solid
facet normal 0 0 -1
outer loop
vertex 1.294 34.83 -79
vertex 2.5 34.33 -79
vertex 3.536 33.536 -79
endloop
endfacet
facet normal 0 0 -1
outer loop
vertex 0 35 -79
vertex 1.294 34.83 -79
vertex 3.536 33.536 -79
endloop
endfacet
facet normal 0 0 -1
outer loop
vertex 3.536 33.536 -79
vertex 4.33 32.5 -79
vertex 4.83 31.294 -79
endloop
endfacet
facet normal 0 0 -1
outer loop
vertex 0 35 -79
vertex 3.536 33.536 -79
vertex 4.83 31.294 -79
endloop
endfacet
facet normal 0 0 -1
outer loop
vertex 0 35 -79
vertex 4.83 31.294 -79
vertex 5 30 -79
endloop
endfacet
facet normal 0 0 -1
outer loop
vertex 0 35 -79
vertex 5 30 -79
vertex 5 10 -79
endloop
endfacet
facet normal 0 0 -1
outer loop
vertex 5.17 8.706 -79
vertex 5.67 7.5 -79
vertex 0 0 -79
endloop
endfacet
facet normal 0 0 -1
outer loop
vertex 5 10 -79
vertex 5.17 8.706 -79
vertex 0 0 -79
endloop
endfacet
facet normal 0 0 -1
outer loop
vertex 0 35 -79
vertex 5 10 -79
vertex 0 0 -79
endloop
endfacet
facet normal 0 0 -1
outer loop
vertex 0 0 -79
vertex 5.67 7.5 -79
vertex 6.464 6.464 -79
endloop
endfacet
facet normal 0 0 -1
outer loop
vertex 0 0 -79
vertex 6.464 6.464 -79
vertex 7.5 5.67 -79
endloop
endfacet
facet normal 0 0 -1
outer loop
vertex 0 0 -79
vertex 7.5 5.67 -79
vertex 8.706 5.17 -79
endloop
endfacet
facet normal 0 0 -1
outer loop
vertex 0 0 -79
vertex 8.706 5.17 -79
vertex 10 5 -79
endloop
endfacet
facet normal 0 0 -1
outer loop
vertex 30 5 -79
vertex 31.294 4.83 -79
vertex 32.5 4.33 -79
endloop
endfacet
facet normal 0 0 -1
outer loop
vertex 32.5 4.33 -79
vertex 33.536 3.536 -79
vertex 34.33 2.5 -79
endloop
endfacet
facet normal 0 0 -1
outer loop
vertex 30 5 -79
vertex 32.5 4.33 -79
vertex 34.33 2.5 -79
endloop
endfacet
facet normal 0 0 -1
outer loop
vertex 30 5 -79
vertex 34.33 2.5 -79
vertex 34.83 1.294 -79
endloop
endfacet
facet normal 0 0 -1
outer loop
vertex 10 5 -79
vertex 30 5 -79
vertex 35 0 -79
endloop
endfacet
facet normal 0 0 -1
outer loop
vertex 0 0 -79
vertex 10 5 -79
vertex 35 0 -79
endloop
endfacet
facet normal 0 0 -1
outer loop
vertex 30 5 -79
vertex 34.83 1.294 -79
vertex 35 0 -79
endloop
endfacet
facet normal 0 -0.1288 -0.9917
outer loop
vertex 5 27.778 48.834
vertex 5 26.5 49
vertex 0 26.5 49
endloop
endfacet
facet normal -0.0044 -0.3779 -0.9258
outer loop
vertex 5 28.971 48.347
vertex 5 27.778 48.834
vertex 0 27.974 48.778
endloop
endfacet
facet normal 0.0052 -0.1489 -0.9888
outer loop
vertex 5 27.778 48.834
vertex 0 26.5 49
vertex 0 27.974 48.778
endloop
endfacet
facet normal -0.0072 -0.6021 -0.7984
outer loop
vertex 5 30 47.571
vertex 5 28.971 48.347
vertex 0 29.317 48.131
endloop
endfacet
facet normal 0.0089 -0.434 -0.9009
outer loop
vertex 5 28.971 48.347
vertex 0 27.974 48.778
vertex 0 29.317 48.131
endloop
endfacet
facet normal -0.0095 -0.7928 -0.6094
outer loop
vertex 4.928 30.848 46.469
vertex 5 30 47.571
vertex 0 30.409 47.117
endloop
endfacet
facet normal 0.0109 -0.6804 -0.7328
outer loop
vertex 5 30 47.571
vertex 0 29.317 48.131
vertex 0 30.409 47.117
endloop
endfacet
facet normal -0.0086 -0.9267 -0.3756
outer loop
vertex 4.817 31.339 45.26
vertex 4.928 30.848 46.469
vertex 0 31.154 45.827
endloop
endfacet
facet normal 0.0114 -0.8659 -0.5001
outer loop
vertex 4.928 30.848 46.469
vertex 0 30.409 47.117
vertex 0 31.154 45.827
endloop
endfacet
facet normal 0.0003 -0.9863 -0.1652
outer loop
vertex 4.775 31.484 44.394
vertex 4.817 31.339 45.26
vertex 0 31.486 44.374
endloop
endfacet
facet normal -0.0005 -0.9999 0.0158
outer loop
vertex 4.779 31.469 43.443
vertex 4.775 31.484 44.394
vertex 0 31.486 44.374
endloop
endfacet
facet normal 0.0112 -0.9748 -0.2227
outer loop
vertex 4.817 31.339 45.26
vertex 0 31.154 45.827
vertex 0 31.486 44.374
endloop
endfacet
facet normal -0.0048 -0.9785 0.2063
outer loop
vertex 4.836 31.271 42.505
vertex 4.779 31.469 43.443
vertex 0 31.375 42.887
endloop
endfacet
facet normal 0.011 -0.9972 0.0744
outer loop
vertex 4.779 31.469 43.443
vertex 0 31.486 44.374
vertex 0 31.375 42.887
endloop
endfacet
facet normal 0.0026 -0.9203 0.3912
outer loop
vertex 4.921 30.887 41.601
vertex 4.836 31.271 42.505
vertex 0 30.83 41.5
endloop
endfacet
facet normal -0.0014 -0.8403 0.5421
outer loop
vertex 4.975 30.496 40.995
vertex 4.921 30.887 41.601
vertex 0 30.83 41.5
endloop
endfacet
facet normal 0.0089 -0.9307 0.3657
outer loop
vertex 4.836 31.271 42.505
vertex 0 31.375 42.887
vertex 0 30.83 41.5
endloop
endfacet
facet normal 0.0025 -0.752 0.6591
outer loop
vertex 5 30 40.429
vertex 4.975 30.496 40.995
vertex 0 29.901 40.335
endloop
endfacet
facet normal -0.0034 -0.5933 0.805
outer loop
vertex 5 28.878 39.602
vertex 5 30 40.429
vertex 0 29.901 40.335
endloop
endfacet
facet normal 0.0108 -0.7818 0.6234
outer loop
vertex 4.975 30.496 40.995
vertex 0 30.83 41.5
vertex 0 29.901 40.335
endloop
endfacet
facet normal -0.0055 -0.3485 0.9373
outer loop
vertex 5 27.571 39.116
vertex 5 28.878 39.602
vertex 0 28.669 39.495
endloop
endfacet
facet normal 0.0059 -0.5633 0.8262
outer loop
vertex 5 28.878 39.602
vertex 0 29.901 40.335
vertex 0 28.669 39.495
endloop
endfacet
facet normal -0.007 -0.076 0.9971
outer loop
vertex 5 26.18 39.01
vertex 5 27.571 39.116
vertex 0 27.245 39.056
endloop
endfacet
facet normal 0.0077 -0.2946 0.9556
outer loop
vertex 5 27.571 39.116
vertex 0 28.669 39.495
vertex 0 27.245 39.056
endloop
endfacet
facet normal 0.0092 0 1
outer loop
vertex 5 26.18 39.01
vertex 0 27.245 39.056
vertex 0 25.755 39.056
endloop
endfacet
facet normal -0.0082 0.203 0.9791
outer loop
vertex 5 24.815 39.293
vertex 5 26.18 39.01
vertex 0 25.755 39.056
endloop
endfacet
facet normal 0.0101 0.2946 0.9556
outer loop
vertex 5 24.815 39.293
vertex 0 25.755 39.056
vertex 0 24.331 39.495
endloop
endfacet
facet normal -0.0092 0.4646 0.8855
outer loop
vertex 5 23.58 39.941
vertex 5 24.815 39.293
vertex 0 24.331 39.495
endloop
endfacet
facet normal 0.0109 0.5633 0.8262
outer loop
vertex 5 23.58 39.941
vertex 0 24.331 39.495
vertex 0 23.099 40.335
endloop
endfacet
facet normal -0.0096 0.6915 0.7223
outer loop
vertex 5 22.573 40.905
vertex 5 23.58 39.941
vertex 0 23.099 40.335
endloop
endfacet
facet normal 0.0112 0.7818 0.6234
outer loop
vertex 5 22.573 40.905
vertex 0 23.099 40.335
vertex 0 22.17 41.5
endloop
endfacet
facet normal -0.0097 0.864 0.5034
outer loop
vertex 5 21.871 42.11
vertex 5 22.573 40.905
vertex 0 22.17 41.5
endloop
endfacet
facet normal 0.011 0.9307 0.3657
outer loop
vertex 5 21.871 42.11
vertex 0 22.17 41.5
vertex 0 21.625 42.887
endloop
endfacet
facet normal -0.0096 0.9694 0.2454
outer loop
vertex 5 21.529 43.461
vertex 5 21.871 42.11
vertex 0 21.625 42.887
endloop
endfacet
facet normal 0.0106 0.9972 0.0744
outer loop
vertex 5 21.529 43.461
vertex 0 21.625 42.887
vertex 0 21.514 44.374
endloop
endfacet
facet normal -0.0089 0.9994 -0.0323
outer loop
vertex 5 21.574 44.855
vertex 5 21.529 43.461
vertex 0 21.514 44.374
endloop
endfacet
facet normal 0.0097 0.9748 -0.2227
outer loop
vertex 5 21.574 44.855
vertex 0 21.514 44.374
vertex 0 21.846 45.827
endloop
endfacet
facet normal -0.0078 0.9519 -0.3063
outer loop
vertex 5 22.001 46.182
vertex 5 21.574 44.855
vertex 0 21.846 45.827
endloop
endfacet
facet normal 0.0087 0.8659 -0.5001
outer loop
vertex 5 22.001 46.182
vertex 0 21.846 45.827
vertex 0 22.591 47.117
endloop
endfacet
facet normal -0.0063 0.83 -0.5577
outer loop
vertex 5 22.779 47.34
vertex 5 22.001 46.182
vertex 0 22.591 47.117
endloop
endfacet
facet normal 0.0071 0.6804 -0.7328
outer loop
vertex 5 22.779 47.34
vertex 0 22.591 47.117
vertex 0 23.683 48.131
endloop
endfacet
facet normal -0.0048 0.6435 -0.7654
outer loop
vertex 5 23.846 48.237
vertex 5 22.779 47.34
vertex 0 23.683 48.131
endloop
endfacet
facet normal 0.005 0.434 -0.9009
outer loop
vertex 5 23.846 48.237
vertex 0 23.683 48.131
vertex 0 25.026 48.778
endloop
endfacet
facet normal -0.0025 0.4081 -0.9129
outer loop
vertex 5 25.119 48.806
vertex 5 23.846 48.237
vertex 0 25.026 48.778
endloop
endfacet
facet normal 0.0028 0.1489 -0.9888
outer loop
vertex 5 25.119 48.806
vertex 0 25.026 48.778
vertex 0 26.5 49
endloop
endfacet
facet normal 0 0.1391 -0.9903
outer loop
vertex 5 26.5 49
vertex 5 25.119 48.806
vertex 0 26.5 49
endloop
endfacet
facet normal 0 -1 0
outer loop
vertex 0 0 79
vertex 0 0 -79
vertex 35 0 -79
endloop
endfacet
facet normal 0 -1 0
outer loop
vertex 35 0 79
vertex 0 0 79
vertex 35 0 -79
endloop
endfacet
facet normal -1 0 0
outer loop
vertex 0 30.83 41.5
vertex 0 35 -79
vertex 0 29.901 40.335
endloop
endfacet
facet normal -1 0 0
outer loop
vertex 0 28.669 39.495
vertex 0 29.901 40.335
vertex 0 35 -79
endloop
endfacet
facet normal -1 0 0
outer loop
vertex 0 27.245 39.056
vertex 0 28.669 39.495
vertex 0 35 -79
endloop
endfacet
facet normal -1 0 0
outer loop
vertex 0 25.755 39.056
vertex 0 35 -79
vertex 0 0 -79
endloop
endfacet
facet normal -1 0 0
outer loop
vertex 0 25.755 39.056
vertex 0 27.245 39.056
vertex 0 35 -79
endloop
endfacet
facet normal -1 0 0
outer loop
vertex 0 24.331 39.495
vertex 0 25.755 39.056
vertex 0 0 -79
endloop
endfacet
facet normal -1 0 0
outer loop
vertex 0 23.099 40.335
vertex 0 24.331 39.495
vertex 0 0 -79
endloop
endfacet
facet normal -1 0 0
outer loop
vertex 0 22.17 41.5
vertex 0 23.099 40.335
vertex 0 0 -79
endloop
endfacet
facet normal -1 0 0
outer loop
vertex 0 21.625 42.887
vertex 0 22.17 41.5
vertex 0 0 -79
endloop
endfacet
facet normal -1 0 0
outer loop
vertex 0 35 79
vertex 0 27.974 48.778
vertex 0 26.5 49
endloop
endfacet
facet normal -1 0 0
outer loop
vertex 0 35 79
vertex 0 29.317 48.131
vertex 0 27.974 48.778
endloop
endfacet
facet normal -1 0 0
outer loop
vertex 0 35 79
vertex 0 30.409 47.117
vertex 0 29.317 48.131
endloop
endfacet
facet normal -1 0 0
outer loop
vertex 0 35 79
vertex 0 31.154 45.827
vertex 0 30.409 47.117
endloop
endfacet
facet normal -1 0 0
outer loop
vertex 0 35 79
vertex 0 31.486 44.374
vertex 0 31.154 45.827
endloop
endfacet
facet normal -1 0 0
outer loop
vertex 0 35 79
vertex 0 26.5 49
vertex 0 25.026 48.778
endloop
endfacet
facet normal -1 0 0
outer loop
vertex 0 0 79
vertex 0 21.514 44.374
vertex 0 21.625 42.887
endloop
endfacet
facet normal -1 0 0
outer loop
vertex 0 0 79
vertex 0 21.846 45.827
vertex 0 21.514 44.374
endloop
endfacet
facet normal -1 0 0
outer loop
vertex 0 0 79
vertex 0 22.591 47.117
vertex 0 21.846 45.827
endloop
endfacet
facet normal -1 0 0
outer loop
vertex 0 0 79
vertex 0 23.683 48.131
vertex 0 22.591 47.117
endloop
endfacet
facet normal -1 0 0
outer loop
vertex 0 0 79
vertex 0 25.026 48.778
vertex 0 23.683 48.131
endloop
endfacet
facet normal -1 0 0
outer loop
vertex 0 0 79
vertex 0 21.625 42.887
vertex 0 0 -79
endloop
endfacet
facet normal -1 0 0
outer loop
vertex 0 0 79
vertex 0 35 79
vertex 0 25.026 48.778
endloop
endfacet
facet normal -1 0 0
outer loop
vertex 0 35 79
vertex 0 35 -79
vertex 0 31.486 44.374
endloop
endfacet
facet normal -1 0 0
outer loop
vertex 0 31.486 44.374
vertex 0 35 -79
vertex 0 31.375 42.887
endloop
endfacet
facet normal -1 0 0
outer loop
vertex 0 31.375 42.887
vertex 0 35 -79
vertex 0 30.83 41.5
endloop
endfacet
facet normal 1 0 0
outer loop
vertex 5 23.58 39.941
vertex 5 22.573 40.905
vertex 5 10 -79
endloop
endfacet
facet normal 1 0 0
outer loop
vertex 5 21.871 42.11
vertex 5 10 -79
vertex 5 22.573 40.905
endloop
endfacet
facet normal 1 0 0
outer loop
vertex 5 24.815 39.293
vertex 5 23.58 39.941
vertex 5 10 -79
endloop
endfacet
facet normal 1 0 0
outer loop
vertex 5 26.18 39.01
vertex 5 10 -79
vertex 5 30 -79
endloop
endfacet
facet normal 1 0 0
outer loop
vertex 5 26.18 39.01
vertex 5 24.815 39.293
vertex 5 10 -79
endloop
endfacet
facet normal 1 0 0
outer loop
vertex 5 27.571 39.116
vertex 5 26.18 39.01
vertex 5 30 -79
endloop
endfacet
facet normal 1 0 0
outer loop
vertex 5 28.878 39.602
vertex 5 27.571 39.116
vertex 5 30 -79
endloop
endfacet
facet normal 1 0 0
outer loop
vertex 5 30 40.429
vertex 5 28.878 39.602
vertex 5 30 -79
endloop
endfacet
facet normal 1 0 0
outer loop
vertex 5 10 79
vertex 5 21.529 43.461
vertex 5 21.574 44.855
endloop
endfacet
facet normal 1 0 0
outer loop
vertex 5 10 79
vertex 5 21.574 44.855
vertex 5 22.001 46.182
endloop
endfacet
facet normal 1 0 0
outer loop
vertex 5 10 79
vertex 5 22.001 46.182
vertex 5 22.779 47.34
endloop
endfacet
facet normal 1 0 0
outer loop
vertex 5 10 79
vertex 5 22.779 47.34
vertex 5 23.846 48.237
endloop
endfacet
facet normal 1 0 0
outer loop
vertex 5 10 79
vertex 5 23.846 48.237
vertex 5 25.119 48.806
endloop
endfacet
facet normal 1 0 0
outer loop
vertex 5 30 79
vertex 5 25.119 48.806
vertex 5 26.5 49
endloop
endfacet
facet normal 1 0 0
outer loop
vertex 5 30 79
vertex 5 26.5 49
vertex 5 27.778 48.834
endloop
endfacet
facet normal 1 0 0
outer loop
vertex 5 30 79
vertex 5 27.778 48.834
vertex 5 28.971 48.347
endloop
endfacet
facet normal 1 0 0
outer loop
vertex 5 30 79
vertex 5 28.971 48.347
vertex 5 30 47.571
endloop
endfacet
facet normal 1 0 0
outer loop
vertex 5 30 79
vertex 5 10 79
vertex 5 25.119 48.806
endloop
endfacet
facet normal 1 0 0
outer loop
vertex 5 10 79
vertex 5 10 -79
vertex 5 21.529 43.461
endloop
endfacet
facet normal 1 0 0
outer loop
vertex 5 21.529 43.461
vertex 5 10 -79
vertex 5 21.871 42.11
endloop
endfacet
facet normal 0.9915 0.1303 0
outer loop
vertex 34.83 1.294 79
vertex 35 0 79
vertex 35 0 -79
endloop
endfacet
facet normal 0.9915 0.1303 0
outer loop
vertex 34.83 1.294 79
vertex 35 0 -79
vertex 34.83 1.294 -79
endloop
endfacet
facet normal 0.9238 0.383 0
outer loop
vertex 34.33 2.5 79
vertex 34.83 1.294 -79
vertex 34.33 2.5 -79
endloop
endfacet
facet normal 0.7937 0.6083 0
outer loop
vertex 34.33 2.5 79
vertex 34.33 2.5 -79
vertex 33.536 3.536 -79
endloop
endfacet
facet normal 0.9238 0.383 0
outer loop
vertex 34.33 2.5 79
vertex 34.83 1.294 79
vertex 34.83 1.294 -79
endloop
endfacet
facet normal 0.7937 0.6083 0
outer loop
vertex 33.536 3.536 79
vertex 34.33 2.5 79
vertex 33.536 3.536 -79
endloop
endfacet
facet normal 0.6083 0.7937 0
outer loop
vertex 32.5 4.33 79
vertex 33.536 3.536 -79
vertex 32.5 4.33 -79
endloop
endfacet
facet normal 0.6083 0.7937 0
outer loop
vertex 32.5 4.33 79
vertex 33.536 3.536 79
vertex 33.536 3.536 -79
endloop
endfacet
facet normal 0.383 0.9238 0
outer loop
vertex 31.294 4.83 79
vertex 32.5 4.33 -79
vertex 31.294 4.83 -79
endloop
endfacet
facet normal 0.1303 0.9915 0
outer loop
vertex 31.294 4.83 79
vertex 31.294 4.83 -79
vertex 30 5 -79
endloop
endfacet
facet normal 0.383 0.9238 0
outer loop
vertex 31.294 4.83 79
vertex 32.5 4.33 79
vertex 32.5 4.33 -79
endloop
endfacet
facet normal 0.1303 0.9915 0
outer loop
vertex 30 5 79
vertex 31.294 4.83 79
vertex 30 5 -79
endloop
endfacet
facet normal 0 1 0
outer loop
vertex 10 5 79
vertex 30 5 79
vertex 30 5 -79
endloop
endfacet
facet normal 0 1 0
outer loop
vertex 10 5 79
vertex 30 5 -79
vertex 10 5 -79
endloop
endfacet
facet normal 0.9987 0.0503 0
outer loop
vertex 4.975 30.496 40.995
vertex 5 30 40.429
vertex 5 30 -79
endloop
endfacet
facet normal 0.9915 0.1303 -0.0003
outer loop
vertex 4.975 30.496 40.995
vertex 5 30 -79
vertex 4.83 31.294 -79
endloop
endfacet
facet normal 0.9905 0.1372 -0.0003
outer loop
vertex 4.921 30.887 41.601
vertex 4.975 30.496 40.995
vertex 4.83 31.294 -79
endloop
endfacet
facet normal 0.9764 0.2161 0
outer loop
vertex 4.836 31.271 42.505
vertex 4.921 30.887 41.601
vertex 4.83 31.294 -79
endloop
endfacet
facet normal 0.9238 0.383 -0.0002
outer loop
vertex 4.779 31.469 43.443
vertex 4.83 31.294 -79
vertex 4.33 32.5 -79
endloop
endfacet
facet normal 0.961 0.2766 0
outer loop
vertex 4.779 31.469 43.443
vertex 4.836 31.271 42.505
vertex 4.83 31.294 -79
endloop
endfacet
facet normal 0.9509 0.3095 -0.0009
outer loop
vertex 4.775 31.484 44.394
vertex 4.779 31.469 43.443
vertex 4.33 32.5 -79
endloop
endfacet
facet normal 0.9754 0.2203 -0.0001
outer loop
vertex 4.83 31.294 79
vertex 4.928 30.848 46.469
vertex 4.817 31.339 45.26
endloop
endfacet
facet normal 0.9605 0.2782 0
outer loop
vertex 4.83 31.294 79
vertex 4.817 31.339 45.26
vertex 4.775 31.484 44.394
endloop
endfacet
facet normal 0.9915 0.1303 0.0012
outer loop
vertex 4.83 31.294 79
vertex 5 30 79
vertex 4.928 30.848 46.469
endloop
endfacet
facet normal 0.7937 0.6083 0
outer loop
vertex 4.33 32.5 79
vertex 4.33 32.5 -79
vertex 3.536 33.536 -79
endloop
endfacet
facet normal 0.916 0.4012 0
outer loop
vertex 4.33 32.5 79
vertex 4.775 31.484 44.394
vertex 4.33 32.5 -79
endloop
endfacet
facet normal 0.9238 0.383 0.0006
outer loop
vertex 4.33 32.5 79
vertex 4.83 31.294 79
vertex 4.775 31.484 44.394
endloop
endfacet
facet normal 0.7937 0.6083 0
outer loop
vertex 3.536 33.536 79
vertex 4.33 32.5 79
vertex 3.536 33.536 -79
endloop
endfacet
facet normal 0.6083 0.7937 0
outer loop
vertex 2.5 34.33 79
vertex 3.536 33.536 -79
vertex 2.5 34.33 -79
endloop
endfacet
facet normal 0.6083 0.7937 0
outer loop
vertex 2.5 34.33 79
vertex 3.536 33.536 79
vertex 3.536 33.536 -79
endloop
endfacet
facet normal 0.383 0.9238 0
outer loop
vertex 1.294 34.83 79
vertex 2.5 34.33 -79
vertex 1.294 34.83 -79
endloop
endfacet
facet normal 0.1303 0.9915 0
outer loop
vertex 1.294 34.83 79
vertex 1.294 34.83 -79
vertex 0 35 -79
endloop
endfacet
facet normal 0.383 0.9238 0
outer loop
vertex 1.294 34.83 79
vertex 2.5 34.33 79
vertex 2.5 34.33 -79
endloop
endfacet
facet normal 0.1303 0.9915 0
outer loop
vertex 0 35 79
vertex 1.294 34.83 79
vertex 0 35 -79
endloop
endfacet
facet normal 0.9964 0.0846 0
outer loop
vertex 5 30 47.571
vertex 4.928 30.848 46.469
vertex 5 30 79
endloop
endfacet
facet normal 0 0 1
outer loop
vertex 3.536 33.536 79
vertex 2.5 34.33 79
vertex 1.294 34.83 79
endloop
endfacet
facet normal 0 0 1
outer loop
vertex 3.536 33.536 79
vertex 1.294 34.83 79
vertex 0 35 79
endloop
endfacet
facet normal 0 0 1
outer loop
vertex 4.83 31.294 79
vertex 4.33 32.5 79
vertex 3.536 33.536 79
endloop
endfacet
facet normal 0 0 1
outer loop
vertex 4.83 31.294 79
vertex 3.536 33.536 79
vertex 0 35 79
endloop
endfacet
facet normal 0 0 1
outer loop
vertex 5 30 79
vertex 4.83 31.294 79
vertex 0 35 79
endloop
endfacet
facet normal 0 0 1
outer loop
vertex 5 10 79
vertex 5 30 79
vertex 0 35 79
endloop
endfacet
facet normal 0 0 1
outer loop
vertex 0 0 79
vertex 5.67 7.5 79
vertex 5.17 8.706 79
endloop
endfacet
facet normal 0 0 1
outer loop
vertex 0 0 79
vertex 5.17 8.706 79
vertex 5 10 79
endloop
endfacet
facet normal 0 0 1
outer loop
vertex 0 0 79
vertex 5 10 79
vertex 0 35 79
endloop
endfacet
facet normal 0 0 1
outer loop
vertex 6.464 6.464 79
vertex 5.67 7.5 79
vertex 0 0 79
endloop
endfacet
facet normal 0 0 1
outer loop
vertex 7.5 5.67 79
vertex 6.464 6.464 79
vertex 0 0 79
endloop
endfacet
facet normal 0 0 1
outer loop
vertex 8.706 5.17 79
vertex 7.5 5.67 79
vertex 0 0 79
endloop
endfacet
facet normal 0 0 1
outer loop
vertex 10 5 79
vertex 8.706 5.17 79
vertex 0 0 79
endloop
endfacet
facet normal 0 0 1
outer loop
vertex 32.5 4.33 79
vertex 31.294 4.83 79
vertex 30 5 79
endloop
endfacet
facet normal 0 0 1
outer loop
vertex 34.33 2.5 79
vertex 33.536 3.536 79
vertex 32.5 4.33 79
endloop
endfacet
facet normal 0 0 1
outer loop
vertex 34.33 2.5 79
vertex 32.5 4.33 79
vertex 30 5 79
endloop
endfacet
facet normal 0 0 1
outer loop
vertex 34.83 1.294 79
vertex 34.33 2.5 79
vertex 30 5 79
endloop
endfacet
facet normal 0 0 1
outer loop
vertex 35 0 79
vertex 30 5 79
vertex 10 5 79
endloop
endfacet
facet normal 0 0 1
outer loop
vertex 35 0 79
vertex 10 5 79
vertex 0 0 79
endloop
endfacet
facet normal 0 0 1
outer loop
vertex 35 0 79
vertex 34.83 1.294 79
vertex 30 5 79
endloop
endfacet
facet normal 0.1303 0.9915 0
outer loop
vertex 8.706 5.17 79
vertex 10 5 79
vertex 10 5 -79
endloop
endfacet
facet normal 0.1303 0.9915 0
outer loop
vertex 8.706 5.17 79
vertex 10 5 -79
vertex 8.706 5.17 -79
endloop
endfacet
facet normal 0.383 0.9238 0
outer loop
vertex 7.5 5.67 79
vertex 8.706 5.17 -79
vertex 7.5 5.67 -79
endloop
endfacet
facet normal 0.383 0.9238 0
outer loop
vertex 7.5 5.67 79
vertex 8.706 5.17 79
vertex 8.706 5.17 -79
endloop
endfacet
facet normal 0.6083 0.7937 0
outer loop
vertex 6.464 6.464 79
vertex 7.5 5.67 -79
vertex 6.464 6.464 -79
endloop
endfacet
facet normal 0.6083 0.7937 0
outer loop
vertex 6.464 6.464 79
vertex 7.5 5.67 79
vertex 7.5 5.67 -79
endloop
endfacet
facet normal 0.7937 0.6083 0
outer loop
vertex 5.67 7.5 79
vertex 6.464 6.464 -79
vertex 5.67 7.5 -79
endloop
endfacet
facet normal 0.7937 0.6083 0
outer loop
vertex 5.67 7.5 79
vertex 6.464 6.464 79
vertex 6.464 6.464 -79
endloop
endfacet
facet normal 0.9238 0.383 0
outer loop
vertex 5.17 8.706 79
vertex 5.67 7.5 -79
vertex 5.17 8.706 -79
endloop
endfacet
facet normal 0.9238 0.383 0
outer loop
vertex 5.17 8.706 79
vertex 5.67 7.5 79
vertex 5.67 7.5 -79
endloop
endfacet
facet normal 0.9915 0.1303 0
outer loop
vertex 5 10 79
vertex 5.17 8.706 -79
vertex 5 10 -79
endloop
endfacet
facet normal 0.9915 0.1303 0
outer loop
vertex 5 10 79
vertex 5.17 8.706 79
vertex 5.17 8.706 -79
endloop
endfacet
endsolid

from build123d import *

# Parameters (mm, degrees)
K_TOWNIK_STALOWY_35_X_35_X_5_1_DEPTH = 158
SZKIC3_R                             = 5
WYTNIJ_WYCI_GNI_CIE1_DEPTH           = 10


with BuildPart() as part:
    # Sketch1 → Kątownik stalowy 35 X 35 X 5(1) (new body)
    with BuildSketch(Plane.YX.offset(-79)):
        with BuildLine():
            Line((0, 0), (0, 35))
            ThreePointArc((0, 35), (3.535533906, 33.535533906), (5, 30))
            Line((5, 30), (5, 10))
            ThreePointArc((5, 10), (6.464466094, 6.464466094), (10, 5))
            Line((10, 5), (30, 5))
            ThreePointArc((30, 5), (33.535533906, 3.535533906), (35, 0))
            Line((35, 0), (0, 0))
        make_face()
    extrude(amount=K_TOWNIK_STALOWY_35_X_35_X_5_1_DEPTH)

    # Szkic3 → Wytnij-wyciągnięcie1 (cut)
    with BuildSketch(Plane.ZY):
        with Locations((44, 26.5)):
            Circle(SZKIC3_R)
    extrude(amount=-WYTNIJ_WYCI_GNI_CIE1_DEPTH, mode=Mode.SUBTRACT)


solid = part.part
